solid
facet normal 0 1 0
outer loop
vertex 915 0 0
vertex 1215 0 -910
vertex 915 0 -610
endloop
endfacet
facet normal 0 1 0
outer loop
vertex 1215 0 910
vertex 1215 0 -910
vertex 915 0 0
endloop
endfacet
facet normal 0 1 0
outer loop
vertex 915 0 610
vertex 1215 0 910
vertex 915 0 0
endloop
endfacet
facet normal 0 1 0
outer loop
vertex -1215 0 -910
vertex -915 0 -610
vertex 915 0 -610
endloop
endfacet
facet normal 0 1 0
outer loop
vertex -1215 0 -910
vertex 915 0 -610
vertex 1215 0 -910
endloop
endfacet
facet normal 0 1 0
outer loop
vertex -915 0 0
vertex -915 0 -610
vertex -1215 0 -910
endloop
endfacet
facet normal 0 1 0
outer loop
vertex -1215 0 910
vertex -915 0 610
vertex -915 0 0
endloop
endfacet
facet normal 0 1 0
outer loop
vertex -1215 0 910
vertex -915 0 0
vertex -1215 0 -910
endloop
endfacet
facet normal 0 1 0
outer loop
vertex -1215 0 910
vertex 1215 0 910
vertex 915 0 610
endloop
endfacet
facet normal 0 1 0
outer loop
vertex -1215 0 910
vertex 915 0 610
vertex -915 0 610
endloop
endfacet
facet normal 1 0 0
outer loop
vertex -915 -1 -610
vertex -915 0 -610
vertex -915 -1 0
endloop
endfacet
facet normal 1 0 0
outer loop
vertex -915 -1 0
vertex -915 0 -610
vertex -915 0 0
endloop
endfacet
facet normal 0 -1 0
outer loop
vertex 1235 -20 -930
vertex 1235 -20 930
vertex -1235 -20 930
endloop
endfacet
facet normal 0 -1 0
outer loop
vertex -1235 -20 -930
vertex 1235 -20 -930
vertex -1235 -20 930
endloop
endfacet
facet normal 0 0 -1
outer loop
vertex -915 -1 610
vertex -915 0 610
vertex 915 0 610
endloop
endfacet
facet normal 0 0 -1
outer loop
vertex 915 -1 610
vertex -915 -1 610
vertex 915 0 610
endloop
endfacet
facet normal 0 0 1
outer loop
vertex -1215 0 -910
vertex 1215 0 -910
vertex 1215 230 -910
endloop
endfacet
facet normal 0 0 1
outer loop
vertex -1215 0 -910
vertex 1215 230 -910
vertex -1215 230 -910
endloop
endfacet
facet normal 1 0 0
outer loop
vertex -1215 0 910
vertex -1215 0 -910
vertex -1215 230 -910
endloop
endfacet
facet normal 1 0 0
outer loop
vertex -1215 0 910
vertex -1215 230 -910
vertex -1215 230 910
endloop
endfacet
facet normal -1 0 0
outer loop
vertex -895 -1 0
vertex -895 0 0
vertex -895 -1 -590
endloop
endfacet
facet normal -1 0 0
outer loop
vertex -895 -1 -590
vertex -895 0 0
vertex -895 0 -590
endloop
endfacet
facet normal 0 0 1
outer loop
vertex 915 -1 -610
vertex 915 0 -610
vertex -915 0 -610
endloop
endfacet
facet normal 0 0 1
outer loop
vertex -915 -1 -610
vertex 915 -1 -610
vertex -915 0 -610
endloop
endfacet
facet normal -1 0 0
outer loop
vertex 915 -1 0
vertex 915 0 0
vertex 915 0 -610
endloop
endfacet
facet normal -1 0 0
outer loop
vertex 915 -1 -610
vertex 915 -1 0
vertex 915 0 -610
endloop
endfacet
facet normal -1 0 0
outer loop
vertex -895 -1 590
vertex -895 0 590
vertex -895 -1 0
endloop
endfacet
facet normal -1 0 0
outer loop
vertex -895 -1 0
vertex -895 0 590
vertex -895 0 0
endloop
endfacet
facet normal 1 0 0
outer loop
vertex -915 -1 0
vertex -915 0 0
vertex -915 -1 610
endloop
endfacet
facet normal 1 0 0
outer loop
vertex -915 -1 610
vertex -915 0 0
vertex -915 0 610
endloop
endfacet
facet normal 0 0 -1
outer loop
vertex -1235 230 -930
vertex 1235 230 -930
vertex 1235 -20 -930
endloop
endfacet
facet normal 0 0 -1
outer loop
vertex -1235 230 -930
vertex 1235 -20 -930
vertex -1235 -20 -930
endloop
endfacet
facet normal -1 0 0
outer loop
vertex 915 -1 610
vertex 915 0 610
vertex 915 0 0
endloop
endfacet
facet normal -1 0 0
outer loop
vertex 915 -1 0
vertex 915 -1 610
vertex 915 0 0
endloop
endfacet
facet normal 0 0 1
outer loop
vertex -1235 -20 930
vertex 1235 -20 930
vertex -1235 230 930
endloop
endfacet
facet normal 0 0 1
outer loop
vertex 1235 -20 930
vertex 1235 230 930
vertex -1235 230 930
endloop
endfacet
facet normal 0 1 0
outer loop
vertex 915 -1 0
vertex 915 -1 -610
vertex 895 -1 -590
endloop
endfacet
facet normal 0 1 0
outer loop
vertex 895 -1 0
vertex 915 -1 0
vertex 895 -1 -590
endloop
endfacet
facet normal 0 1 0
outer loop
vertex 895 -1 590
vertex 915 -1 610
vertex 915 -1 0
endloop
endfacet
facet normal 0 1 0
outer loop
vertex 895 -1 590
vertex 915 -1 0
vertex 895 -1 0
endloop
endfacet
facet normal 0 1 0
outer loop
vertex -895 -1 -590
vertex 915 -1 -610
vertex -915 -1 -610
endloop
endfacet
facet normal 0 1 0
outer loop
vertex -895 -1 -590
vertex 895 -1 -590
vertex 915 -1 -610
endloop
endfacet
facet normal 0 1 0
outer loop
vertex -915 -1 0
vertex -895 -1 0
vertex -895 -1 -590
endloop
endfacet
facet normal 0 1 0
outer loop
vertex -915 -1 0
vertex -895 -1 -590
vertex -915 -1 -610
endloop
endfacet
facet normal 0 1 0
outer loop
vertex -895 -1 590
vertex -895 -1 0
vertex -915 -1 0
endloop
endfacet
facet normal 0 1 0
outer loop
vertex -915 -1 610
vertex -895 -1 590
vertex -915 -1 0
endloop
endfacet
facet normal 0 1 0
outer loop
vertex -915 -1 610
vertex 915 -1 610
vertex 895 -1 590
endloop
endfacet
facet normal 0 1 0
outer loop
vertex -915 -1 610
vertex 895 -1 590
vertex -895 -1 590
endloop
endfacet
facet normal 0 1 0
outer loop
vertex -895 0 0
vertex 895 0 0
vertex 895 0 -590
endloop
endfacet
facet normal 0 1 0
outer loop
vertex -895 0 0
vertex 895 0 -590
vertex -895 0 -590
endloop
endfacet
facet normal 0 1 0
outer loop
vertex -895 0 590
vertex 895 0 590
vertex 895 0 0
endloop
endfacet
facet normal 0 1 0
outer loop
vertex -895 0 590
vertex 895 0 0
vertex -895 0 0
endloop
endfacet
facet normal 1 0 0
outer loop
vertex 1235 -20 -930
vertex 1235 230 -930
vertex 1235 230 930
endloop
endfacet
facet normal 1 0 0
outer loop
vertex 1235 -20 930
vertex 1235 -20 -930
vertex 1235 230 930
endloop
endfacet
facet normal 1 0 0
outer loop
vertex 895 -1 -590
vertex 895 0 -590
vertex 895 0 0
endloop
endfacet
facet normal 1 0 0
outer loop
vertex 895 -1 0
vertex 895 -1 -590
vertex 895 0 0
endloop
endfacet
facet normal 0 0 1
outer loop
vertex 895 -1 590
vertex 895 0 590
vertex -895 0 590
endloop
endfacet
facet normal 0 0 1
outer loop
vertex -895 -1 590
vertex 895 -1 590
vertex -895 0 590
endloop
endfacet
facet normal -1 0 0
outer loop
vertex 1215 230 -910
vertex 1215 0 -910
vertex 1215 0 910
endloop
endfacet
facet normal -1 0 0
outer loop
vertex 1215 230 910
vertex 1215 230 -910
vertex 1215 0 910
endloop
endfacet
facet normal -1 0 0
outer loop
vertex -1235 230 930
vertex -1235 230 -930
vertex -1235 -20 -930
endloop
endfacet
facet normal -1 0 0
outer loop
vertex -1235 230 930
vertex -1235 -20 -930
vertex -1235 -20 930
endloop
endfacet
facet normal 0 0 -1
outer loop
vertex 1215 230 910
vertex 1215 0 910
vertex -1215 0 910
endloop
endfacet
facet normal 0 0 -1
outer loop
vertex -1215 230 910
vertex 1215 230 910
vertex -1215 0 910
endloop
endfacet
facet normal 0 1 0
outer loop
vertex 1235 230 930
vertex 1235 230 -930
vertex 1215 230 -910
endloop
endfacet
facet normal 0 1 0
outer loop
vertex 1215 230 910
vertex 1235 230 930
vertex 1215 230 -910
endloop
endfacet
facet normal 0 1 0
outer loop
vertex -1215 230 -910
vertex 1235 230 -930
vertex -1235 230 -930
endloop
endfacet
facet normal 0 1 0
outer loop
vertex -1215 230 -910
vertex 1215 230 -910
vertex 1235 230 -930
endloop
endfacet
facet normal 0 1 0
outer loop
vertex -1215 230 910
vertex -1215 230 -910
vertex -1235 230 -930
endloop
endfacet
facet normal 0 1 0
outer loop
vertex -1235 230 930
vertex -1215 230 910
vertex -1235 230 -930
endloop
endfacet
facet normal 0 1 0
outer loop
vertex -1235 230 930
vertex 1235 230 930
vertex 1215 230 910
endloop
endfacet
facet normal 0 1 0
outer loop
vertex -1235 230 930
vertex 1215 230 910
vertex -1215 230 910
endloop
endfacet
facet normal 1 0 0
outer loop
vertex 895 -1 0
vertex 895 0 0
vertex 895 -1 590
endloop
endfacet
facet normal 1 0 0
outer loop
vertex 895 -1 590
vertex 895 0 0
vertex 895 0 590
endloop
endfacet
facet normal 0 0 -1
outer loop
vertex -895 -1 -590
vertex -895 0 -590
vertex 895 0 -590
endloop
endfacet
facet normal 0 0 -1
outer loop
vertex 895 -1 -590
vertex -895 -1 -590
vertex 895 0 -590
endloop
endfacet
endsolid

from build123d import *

# Parameters (mm, degrees)
SKETCH_1_W      = 2470
SKETCH_1_H      = 1860
SKETCH_1_W_2    = 2430
SKETCH_1_H_2    = 1820
EXTRUDE_1_DEPTH = 230
SKETCH_2_W      = 2470
SKETCH_2_H      = 1860
EXTRUDE_2_DEPTH = 20
SKETCH_3_R      = 0.0001
EXTRUDE_3_DEPTH = 1


with BuildPart() as part:
    # Эскиз1 → Выдавливание1 (new body)
    with BuildSketch(Plane(origin=(0, 0, 0), x_dir=(-1, 0, 0), z_dir=(0, 1, 0))):
        Rectangle(SKETCH_1_W, SKETCH_1_H)
        Rectangle(SKETCH_1_W_2, SKETCH_1_H_2, mode=Mode.SUBTRACT)
    extrude(amount=EXTRUDE_1_DEPTH)

    # Эскиз2 → Выдавливание2 (add)
    with BuildSketch(Plane(origin=(0, 0, 0), x_dir=(-1, 0, 0), z_dir=(0, 1, 0))):
        Rectangle(SKETCH_2_W, SKETCH_2_H)
    extrude(amount=-EXTRUDE_2_DEPTH)

    # Эскиз3 → Выдавливание3 (cut)
    with BuildSketch(Plane(origin=(0, 0, 0), x_dir=(-1, 0, 0), z_dir=(0, 1, 0))):
        Polygon((-915, 610), (-915, 0.0001), (-915, -610), (915, -610), (915, 0.0001), (915, 610), align=None)
        with Locations((914.9999, 0.0001)):
            Circle(SKETCH_3_R, mode=Mode.SUBTRACT)
        with Locations((895.0001, 0.0001)):
            Circle(SKETCH_3_R, mode=Mode.SUBTRACT)
        with Locations((-895.0001, 0.0001)):
            Circle(SKETCH_3_R, mode=Mode.SUBTRACT)
        with Locations((-914.9999, 0.0001)):
            Circle(SKETCH_3_R, mode=Mode.SUBTRACT)
        with Locations((895.0001, -0.0001)):
            Circle(SKETCH_3_R, mode=Mode.SUBTRACT)
        with Locations((914.9999, -0.0001)):
            Circle(SKETCH_3_R, mode=Mode.SUBTRACT)
        with Locations((-914.9999, -0.0001)):
            Circle(SKETCH_3_R, mode=Mode.SUBTRACT)
        with Locations((-895.0001, -0.0001)):
            Circle(SKETCH_3_R, mode=Mode.SUBTRACT)
        Polygon((-895, 0.0001), (-895, 590), (895, 590), (895, 0.0001), (895, -590), (-895, -590), align=None, mode=Mode.SUBTRACT)
    extrude(amount=-EXTRUDE_3_DEPTH, mode=Mode.SUBTRACT)


solid = part.part
